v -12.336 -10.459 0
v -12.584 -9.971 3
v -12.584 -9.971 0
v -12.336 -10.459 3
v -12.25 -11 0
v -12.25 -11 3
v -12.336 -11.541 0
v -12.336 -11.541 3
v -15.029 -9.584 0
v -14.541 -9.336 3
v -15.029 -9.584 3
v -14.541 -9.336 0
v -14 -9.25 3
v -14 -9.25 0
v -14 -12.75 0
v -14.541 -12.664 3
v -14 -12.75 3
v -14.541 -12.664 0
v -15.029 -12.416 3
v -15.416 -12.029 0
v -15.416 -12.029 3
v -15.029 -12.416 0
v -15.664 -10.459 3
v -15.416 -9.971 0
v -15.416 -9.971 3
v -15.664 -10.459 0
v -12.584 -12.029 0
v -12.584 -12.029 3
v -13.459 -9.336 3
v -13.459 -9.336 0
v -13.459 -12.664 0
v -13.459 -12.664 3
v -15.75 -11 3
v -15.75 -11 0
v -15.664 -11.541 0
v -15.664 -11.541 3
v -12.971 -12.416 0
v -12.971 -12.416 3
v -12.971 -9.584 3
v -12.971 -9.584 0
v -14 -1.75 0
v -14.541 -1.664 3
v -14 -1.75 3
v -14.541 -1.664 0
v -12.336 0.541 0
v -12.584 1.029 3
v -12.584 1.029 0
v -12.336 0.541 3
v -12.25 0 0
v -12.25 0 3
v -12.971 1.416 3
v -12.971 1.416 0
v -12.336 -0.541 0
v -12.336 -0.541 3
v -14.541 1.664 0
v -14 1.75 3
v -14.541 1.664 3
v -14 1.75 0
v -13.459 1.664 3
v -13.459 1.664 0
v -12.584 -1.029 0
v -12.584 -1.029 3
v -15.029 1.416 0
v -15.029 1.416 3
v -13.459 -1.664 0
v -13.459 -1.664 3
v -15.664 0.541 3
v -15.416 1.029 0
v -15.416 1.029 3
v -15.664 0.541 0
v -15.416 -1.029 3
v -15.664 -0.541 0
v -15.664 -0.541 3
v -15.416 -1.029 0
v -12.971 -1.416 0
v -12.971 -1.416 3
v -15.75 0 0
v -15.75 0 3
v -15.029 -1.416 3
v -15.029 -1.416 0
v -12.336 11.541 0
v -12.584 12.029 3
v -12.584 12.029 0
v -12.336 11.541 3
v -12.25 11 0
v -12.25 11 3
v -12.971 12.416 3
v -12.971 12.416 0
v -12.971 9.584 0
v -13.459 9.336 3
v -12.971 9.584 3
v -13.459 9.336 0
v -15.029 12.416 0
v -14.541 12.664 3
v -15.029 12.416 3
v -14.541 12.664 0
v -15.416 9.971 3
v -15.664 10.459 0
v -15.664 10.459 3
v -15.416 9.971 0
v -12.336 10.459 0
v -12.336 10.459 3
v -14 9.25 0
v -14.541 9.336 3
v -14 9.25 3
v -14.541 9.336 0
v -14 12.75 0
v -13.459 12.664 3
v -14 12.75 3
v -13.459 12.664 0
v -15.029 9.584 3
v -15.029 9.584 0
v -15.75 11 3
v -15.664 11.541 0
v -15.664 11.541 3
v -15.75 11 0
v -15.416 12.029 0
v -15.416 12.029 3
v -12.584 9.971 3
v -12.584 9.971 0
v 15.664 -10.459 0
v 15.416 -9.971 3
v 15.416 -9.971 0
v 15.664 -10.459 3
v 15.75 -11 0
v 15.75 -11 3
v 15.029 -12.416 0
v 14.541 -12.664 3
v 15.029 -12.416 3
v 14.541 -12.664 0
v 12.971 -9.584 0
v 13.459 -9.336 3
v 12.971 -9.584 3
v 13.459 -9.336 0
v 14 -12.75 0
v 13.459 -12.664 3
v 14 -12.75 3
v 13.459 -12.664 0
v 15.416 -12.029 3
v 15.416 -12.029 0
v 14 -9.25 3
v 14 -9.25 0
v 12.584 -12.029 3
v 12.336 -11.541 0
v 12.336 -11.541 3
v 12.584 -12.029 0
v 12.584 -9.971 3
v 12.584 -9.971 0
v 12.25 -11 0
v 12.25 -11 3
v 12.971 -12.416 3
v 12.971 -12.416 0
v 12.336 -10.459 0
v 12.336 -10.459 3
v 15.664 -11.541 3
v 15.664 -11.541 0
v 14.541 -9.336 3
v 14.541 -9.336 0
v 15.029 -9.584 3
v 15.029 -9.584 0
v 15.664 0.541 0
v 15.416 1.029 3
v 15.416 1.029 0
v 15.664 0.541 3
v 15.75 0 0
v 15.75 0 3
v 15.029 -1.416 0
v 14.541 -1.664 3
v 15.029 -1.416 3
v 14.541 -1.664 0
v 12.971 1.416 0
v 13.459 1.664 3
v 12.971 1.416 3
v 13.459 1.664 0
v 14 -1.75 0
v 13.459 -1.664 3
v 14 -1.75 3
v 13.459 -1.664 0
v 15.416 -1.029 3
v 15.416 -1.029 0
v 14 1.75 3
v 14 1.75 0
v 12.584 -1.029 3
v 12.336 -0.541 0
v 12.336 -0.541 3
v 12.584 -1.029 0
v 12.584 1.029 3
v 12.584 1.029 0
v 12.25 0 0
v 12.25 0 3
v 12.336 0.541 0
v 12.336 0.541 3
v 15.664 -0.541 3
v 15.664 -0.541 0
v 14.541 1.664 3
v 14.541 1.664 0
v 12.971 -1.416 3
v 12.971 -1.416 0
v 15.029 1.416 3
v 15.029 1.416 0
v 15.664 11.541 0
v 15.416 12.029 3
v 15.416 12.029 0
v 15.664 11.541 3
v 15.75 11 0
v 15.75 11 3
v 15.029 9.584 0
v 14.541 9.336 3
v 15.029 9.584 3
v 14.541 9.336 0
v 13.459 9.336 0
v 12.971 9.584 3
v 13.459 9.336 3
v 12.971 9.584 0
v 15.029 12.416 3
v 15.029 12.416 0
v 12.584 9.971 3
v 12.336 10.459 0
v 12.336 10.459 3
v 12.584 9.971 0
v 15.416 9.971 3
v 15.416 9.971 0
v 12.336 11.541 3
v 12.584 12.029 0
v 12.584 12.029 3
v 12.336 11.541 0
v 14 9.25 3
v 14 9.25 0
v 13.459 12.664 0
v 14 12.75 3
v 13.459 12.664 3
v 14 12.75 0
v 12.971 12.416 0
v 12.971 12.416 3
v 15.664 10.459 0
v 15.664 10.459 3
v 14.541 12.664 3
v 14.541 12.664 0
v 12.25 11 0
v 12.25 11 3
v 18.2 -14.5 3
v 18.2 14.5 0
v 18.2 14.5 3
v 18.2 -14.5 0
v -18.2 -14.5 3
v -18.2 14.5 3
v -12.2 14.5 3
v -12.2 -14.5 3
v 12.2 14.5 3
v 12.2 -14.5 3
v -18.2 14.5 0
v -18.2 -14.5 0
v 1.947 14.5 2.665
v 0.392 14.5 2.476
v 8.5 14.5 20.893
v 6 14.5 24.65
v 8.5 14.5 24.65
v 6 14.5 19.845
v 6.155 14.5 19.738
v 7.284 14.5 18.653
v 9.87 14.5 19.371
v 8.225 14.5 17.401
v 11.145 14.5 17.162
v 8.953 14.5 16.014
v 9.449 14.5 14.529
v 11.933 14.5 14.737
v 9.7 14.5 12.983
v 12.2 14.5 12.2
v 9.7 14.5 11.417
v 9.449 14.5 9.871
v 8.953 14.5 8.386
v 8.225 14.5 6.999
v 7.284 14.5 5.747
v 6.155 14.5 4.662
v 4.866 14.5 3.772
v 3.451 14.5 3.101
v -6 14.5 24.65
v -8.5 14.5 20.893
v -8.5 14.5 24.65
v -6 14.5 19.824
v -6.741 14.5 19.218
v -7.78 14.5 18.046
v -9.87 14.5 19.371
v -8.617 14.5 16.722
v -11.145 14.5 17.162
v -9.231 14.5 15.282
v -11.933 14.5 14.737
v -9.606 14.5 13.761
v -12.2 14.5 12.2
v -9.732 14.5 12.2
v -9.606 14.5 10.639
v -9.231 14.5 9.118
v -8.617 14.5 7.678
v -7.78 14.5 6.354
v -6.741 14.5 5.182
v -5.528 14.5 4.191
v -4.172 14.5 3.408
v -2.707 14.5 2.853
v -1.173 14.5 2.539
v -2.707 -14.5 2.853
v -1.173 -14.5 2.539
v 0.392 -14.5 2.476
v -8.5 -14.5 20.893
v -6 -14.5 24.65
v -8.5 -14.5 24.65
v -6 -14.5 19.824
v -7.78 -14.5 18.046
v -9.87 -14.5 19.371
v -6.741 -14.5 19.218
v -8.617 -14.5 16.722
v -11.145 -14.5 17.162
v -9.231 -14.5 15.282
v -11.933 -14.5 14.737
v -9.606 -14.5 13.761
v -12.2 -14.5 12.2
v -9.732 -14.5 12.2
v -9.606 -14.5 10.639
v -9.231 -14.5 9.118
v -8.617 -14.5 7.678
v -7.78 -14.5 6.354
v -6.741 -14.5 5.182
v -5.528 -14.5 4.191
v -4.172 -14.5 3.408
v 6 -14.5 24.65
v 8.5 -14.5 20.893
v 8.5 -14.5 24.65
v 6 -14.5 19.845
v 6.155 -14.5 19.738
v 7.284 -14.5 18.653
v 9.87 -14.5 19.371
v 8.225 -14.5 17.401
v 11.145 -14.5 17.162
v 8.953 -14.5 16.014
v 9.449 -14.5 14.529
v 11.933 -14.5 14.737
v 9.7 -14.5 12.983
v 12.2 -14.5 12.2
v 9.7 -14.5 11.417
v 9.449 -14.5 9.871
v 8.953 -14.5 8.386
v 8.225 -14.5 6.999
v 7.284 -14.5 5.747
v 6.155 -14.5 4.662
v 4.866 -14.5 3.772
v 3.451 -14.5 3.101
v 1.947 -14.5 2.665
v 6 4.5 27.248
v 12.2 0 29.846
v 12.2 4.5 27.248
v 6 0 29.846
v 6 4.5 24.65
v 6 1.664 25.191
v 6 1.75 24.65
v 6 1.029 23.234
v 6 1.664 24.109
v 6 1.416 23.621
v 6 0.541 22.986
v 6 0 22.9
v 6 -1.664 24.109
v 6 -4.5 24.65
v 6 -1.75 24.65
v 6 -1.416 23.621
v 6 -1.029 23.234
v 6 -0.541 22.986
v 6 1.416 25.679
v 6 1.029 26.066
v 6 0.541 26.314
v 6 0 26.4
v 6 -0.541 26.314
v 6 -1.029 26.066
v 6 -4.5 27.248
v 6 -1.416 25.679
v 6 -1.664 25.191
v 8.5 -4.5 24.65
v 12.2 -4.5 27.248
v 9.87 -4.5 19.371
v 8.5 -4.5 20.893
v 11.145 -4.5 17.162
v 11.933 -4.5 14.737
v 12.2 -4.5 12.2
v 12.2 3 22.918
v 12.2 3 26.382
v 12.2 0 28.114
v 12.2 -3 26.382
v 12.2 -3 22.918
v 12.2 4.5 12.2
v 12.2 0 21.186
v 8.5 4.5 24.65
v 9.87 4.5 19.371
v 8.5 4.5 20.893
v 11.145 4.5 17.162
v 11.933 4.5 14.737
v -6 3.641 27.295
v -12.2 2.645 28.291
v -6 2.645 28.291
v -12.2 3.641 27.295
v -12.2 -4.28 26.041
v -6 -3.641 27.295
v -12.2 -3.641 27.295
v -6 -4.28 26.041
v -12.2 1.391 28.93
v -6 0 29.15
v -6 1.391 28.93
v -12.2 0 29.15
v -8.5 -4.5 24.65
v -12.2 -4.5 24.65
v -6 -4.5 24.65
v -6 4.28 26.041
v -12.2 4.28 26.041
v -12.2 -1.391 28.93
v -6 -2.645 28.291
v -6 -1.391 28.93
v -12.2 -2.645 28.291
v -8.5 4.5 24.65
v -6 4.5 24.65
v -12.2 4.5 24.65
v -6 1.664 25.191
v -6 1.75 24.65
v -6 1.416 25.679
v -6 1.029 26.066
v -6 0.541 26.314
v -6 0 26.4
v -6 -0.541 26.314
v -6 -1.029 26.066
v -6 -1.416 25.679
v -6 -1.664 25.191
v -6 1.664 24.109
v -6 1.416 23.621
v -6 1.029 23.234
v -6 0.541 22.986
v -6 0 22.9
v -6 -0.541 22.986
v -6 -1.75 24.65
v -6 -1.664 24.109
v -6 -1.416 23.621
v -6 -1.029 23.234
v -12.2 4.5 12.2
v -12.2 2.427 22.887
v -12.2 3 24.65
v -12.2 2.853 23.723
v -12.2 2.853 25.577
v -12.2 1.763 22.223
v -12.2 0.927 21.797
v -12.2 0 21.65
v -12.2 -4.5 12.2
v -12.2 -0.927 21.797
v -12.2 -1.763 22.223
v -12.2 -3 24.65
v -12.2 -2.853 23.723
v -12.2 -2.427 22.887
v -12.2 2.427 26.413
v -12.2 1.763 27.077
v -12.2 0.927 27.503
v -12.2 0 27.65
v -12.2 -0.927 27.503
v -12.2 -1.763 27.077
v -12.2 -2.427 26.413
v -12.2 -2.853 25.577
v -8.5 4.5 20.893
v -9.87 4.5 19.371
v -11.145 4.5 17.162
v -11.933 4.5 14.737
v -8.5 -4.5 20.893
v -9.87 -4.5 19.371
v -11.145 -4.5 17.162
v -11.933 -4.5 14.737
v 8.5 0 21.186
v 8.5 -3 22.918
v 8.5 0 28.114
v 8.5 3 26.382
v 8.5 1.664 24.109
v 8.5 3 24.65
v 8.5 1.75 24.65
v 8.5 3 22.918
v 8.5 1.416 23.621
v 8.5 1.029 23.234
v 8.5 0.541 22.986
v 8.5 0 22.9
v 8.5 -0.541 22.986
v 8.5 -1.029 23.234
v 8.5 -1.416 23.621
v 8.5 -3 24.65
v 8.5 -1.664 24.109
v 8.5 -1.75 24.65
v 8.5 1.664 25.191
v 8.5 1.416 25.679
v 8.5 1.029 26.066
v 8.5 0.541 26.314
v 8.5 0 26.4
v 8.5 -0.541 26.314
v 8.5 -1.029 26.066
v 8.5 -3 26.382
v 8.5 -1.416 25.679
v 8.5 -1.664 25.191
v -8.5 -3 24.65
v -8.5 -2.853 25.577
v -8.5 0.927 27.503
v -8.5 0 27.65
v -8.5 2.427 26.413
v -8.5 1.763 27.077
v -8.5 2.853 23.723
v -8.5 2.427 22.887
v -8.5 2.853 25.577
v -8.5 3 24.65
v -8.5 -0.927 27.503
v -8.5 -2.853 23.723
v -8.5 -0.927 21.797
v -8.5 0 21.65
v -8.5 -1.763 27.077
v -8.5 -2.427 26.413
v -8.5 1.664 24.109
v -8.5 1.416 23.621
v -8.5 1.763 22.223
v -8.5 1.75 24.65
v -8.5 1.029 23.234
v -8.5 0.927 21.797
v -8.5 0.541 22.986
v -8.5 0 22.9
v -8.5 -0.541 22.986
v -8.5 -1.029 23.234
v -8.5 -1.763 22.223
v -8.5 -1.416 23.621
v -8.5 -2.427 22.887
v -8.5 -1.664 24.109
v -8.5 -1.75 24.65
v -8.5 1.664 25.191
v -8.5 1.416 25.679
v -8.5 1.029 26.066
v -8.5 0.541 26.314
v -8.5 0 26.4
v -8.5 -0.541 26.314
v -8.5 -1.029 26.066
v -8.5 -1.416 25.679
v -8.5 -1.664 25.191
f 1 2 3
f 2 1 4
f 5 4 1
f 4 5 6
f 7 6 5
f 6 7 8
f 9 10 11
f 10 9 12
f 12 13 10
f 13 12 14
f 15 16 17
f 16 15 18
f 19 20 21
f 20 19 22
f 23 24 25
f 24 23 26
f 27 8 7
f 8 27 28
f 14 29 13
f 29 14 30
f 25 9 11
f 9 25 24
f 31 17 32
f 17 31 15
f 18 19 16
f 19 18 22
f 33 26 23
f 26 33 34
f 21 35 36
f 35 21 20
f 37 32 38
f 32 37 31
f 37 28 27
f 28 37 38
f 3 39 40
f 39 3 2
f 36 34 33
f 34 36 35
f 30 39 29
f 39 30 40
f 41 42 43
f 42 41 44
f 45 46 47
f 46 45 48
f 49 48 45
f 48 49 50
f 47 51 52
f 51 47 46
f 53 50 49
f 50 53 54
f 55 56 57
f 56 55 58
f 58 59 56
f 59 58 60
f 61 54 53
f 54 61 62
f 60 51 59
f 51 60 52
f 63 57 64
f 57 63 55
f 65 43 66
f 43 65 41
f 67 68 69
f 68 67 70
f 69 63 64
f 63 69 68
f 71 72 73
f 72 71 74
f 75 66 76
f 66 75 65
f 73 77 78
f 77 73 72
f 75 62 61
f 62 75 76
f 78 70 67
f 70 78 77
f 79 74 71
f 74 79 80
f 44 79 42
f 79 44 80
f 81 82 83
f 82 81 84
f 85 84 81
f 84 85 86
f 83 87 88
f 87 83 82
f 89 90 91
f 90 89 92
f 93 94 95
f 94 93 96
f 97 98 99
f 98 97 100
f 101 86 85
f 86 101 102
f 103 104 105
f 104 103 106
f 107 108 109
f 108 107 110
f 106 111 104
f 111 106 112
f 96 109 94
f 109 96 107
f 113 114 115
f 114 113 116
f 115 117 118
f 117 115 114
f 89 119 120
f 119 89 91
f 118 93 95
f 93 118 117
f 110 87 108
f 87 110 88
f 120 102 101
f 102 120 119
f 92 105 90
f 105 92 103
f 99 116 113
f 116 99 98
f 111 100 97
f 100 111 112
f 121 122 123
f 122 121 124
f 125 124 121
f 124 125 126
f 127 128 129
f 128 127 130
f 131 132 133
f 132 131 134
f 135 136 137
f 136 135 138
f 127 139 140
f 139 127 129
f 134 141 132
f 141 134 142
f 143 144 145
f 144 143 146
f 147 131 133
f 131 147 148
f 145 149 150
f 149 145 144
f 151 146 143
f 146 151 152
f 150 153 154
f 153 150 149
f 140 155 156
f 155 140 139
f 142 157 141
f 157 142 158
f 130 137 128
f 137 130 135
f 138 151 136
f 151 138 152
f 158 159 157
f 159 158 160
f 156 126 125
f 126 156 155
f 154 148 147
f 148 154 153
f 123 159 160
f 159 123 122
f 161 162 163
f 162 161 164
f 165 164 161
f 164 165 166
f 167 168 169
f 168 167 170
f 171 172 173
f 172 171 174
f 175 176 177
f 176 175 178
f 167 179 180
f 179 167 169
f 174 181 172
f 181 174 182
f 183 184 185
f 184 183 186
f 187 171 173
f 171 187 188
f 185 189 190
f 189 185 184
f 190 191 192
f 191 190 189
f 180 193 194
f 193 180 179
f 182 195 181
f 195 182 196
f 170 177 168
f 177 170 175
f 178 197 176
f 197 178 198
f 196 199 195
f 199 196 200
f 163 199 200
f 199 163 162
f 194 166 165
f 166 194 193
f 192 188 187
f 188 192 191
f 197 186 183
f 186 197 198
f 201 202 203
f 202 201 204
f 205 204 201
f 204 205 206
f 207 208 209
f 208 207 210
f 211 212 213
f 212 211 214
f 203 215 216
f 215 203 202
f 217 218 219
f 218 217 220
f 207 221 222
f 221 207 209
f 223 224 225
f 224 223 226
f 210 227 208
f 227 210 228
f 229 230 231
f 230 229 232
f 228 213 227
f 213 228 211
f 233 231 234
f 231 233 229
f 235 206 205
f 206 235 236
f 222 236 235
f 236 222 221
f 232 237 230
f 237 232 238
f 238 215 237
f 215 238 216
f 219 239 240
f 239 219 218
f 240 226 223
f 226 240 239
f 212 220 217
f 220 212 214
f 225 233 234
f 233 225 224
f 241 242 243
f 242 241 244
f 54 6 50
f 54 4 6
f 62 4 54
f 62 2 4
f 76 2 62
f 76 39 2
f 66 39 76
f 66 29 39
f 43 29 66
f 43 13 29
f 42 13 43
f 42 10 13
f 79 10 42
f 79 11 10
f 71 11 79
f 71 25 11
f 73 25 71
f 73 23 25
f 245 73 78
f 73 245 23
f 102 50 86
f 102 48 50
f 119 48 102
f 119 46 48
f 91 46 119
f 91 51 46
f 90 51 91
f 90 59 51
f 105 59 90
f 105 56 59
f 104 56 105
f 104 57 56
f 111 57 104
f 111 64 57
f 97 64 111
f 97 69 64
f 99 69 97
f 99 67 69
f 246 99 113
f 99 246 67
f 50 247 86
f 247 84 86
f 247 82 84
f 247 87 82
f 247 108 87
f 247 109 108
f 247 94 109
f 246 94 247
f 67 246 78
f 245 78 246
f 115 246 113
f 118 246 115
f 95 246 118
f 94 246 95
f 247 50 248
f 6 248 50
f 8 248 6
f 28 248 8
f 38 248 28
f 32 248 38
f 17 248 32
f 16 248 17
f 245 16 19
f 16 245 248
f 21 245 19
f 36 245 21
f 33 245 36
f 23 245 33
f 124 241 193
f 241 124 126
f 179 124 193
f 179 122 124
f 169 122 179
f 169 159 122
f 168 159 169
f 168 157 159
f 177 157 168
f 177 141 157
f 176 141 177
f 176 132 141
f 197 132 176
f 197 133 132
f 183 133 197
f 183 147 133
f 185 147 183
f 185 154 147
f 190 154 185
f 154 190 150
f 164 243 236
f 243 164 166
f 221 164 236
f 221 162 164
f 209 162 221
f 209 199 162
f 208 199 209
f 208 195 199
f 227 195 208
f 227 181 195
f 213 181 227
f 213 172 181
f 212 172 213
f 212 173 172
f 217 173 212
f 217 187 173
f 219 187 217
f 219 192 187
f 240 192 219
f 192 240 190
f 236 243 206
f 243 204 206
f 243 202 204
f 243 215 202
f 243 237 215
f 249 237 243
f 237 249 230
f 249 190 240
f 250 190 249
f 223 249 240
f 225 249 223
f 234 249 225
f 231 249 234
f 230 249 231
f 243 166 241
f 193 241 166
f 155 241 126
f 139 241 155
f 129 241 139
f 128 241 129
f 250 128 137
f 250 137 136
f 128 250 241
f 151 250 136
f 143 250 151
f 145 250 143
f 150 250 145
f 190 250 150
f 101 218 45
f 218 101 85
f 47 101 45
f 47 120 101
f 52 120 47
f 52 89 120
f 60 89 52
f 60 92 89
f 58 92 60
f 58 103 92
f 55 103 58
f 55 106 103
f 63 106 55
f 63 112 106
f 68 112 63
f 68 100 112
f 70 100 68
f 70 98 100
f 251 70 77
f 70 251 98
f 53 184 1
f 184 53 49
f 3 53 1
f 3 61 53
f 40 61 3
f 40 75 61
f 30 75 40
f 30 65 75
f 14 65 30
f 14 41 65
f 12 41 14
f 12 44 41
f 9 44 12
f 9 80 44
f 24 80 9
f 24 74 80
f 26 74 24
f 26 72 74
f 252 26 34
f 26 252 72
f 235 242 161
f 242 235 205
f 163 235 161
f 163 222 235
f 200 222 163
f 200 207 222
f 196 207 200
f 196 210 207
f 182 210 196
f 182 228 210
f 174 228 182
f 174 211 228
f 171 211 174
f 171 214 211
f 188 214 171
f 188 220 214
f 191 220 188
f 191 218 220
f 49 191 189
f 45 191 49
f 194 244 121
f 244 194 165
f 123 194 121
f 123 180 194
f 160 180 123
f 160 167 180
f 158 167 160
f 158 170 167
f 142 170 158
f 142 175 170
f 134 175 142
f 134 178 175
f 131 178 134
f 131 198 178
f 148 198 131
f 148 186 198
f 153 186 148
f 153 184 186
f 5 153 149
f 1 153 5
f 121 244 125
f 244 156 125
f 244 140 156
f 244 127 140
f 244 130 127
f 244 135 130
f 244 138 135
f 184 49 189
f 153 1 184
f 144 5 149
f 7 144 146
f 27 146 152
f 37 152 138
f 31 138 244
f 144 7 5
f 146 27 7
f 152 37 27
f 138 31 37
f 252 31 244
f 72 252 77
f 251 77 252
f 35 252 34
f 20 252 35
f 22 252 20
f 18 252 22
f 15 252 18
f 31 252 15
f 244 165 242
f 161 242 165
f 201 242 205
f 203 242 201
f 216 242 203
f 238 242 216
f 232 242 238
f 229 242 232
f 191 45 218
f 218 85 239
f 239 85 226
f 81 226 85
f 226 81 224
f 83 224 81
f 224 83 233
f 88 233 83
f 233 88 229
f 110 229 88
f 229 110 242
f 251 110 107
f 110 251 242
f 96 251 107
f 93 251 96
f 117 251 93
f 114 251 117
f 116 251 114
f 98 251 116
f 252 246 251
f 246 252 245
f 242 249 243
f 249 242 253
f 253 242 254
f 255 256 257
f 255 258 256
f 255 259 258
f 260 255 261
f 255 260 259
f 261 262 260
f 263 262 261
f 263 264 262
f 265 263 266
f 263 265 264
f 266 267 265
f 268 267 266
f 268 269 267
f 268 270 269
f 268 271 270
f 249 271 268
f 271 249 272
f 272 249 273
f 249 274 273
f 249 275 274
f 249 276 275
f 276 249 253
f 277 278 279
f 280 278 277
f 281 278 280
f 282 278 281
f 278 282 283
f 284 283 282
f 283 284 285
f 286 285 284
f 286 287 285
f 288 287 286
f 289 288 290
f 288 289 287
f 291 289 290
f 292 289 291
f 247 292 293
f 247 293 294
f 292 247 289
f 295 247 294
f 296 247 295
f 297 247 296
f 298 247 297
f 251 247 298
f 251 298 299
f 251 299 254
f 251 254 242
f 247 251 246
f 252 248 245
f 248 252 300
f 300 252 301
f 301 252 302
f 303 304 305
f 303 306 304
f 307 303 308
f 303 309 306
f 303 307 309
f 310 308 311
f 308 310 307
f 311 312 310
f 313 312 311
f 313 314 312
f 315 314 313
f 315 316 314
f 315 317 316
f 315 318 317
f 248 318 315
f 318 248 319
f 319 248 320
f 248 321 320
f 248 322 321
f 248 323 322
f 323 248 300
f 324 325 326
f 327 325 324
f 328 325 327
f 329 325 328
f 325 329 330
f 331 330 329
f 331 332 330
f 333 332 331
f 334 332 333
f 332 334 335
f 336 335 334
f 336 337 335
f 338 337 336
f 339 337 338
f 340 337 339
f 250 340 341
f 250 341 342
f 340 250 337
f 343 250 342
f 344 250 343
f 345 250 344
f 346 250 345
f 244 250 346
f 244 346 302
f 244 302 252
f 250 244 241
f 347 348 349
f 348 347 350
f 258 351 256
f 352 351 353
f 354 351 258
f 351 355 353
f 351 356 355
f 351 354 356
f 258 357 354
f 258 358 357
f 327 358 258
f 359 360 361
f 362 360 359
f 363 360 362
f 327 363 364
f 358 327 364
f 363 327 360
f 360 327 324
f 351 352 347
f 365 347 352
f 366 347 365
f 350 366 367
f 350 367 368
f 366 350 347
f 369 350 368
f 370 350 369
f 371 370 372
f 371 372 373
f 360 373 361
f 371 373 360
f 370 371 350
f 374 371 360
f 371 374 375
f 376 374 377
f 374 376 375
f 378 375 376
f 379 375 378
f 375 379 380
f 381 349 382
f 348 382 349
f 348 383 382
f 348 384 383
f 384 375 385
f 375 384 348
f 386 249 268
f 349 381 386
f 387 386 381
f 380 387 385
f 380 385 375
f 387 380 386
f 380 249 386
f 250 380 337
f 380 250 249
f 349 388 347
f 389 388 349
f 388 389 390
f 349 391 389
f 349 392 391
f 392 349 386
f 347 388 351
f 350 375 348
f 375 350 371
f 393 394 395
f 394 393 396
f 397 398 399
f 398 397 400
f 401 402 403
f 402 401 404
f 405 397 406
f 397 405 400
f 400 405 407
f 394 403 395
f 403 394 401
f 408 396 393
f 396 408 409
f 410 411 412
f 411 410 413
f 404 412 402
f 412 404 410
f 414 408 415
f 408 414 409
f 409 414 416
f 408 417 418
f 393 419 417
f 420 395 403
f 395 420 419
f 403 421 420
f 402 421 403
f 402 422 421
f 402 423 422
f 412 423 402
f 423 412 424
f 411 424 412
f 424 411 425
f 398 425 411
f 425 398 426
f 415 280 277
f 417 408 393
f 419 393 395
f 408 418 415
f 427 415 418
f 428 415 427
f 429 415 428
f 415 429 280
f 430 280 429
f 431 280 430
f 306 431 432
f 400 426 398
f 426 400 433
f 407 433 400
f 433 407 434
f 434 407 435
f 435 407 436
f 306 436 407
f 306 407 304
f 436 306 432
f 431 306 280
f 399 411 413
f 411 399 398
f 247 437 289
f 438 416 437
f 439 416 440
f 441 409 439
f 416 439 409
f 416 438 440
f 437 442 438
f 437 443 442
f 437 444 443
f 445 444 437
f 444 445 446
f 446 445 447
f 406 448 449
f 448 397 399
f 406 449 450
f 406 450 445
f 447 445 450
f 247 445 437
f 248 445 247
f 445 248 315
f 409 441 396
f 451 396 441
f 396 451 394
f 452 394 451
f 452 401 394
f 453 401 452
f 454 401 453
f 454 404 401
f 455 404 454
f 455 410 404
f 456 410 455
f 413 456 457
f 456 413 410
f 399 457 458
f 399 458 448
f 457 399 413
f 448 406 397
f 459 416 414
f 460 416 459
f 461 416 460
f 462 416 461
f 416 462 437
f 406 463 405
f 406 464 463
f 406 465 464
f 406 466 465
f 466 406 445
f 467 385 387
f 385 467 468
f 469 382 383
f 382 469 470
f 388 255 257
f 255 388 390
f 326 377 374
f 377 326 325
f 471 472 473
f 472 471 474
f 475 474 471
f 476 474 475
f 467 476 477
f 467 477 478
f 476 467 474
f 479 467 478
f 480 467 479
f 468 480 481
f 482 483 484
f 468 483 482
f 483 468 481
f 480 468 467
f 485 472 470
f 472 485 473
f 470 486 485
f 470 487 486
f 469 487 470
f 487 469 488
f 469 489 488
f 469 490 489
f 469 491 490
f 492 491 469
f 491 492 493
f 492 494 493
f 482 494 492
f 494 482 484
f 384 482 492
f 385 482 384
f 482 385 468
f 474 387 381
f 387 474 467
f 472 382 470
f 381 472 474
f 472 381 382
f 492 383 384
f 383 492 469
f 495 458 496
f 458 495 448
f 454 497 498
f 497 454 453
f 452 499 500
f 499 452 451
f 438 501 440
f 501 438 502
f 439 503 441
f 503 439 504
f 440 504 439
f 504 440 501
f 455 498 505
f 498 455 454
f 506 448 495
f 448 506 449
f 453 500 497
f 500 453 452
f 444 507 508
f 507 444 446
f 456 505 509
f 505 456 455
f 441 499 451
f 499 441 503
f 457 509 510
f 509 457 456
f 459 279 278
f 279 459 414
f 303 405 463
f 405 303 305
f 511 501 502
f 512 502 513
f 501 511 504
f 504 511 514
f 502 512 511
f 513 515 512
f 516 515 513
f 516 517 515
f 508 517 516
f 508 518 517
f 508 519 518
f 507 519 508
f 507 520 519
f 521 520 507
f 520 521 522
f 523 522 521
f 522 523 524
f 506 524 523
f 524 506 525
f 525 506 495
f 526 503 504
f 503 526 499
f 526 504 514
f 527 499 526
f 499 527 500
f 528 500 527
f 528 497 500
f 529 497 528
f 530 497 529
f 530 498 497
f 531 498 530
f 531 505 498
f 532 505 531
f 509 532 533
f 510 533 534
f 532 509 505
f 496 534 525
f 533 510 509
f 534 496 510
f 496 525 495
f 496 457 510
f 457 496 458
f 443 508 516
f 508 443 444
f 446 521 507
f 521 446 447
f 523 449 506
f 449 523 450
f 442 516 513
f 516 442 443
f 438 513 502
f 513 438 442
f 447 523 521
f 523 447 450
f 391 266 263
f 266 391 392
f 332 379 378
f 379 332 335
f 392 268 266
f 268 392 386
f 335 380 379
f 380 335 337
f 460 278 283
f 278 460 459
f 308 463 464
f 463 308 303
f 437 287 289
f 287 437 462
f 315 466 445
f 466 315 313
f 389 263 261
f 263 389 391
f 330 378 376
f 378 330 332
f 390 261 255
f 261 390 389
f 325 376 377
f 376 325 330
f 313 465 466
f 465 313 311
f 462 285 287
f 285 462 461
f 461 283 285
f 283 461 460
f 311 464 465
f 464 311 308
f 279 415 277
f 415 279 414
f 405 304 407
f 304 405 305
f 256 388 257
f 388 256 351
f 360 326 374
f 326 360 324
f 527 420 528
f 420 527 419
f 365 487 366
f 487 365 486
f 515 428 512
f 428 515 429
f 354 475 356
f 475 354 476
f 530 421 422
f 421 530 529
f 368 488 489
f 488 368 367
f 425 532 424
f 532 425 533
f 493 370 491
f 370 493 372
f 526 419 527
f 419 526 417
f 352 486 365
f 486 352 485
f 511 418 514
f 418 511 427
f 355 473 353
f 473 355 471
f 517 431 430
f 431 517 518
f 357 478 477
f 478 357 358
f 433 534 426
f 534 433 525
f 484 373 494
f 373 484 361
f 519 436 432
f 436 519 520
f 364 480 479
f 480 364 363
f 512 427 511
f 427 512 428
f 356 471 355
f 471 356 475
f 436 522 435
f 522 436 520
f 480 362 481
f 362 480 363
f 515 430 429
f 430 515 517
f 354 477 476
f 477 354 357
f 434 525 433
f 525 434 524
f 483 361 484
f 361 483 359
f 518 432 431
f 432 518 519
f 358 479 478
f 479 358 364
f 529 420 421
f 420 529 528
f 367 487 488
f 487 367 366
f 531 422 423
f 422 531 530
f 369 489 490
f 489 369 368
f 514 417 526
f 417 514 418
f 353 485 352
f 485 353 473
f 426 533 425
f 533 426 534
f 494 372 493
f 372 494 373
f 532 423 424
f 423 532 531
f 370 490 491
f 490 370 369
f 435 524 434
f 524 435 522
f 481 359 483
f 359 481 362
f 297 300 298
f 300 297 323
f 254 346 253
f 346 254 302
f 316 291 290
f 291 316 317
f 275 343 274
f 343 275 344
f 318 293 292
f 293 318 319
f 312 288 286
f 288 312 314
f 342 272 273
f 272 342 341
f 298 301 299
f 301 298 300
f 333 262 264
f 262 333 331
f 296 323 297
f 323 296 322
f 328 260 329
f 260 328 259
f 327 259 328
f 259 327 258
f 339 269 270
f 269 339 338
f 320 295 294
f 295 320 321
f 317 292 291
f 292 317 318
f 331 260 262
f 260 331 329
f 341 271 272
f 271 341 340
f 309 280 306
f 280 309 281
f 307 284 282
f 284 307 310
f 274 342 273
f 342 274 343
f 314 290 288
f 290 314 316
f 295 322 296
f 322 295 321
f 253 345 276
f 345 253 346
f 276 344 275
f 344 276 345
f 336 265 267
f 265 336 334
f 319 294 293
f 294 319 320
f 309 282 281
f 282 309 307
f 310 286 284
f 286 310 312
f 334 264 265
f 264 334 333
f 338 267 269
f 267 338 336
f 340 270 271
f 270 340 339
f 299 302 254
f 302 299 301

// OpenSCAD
// lm10uu holder slim v1.1
// *********************************************
// Jonas Kühling
// http://www.jonaskuehling.de
// http://www.thingiverse.com/jonaskuehling
// *********************************************
// derived from:
// http://www.thingiverse.com/thing:14942

// lm10uu/rod dimensions
lm10uu_dia = 19.4;
lm10uu_length = 29;
rod_dia = 10;

LM8LUU_length = 65;

//screw/nut dimensions (M3) - hexagon socket head cap screw ISO 4762, hexagon nut ISO 4032
screw_thread_dia_iso = 3;
screw_head_dia_iso = 5.5;
nut_wrench_size_iso = 5.5;


// screw/nut dimensions for use (plus clearance for fitting purpose)
clearance_dia = 0.5;
screw_thread_dia = screw_thread_dia_iso + clearance_dia;
screw_head_dia = screw_head_dia_iso + clearance_dia;
nut_wrench_size = nut_wrench_size_iso + clearance_dia;
nut_dia_perimeter = (nut_wrench_size/cos(30));
nut_dia = nut_dia_perimeter;
nut_surround_thickness = 1.5;

// main body dimensions
body_wall_thickness = 2.5;
body_width = lm10uu_dia + (2*body_wall_thickness);
body_height = body_width;
default_body_length = lm10uu_length;
gap_width = rod_dia + 2;
screw_bushing_space = 1;
screw_elevation = lm10uu_dia + body_wall_thickness + (screw_thread_dia/2) +screw_bushing_space;

lm10uu_holder_width = body_width;
lm10uu_holder_length = default_body_length;
lm8luu_holder_length = LM8LUU_length;
lm10uu_holder_height = body_height;
lm10uu_support_thickness = body_wall_thickness;
lm10uu_holder_gap=5;
lm10uu_diameter = lm10uu_dia;

// TEST - uncomment to render in openscad:
 lm10uu_holder(1);		// WITH mountplate
// lm10uu_holder();		// WITHOUT mountplate
//lm8luu_bearing_holder();
//color([1,0,0]) cube([24,5,5], center=true);

module lm10uu_bearing_holder(with_mountplate=false) {
	translate([body_width/2,default_body_length/2,0])
	rotate([0,0,0])
	lm10uu_holder(with_mountplate);
}

module lm8luu_bearing_holder(with_mountplate=false) {
	translate([body_width/2,LM8LUU_length/2,0])
	rotate([0,0,0])
	lm10uu_holder(with_mountplate, LM8LUU_length);
}

module lm10uu_mounting_cutout()
{
  translate([0,0,0])
  cube([body_width,
	default_body_length,
	body_height]);
}

module lm8luu_mounting_cutout()
{
  translate([0,0,0])
  cube([body_width,
	LM8LUU_length,
	body_height]);
}

// nophead's polyhole module for better lm10uu-fit
module polyhole(d,h) {
    n = max(round(2 * d),3);
    rotate([0,0,180])
        cylinder(h = h, r = (d / 2) / cos (180 / n), $fn = n);
}


module mount_plate(body_length)
{
	difference()
	{
		translate([0,0,1.5])
		cube([body_width+2*screw_head_dia,body_length,3], center=true);

		for(i=[-1,1])
			for(j=[-1,0,1])
				translate([i*28/2,j*11,-0.5])
					cylinder(r=screw_thread_dia/2, h=4, $fn=20);
	}
}

module screw_mount(y_offset) {
	difference() {
		union() {
			// nut trap surround
			translate([gap_width/2,y_offset,screw_elevation])
				rotate([0,90,0])
					cylinder(r=(((nut_wrench_size+nut_surround_thickness*2)/cos(30))/2), h=(body_width-gap_width)/2, $fn=6);
			translate([gap_width/2+(body_width-gap_width)/4,y_offset,screw_elevation/2])
				cube([(body_width-gap_width)/2,nut_wrench_size+(nut_surround_thickness*2),screw_elevation],center=true);
		
			// Screw hole surround
			translate([-gap_width/2,y_offset,screw_elevation])
				rotate([0,-90,0])
					cylinder(r=(screw_head_dia/2)+nut_surround_thickness, h=(body_width-gap_width)/2, $fn=20);
			translate([-(gap_width/2+(body_width-gap_width)/4),y_offset,screw_elevation/2])
				cube([(body_width-gap_width)/2,screw_head_dia+(nut_surround_thickness*2),screw_elevation],center=true);
		}
	
		// nut trap
		translate([gap_width/2+body_wall_thickness,y_offset,screw_elevation])
			rotate([0,90,0])
				cylinder(r=nut_dia/2, h=body_width/2-gap_width/2-body_wall_thickness+1,$fn=6);
	
		// screw head hole
		translate([-(gap_width)/2-body_wall_thickness,y_offset,screw_elevation])
			rotate([0,-90,0])
				cylinder(r=screw_head_dia/2, h=body_width/2-gap_width/2-body_wall_thickness+1,$fn=20);
	}
}

module screw_hole(y_offset) {
	// screw hole (one all the way through)
	translate([0,y_offset,screw_elevation])
		rotate([0,90,0])
			cylinder(r=screw_thread_dia/2, h=body_width+3, center=true, $fn=20);
}

// main body
module lm10uu_holder(with_mountplate=false, body_length=default_body_length)
{
	difference()
	{
		union()
		{
			if (with_mountplate) 
			mount_plate(body_length);
	
			// body
			translate([0,0,body_height/4])
				cube([body_width,body_length,body_height/2], center=true);
			translate([0,0,(lm10uu_dia/2)+body_wall_thickness])		
				rotate([90,0,0])
					cylinder(r=(lm10uu_dia/2)+body_wall_thickness, h=body_length, center=true);
	
			// gap support
			translate([-(gap_width/2)-body_wall_thickness,-(body_length/2),body_height/2])
				cube([body_wall_thickness,body_length,(lm10uu_dia/2)+screw_bushing_space+(screw_thread_dia/2)]);
			translate([gap_width/2,-(body_length/2),body_height/2])
				cube([body_wall_thickness,body_length,(lm10uu_dia/2)+screw_bushing_space+(screw_thread_dia/2)]);
	
	
			if (body_length > 40) {
				for (i=[-1,1])
					screw_mount(i*body_length/3);
			} else {
				screw_mount(0);
			}
		}
	
		if (body_length > 40) {
			for (i=[-1,1])
				screw_hole(i*body_length/3);
		} else {
			screw_hole(0);
		}

		// bushing hole
		translate([0,0,lm10uu_dia/2+body_wall_thickness])
			rotate([90,0,0])
//				cylinder(r=lm10uu_dia/2, h=lm10uu_length+1, center=true);
				translate([0,0,-(body_length+1)/2]) polyhole(lm10uu_dia,body_length+1);	// TESTING POLYHOLE MODULE FOR BETTER lm10uu FIT
	
		// top gap
		translate([-(gap_width/2),-(body_length/2)-1,body_height/2])
			cube([gap_width,body_length+2,(lm10uu_dia/2)+screw_bushing_space+(screw_thread_dia/2)+(nut_dia/2)+nut_surround_thickness+1]);
	
	}
}
